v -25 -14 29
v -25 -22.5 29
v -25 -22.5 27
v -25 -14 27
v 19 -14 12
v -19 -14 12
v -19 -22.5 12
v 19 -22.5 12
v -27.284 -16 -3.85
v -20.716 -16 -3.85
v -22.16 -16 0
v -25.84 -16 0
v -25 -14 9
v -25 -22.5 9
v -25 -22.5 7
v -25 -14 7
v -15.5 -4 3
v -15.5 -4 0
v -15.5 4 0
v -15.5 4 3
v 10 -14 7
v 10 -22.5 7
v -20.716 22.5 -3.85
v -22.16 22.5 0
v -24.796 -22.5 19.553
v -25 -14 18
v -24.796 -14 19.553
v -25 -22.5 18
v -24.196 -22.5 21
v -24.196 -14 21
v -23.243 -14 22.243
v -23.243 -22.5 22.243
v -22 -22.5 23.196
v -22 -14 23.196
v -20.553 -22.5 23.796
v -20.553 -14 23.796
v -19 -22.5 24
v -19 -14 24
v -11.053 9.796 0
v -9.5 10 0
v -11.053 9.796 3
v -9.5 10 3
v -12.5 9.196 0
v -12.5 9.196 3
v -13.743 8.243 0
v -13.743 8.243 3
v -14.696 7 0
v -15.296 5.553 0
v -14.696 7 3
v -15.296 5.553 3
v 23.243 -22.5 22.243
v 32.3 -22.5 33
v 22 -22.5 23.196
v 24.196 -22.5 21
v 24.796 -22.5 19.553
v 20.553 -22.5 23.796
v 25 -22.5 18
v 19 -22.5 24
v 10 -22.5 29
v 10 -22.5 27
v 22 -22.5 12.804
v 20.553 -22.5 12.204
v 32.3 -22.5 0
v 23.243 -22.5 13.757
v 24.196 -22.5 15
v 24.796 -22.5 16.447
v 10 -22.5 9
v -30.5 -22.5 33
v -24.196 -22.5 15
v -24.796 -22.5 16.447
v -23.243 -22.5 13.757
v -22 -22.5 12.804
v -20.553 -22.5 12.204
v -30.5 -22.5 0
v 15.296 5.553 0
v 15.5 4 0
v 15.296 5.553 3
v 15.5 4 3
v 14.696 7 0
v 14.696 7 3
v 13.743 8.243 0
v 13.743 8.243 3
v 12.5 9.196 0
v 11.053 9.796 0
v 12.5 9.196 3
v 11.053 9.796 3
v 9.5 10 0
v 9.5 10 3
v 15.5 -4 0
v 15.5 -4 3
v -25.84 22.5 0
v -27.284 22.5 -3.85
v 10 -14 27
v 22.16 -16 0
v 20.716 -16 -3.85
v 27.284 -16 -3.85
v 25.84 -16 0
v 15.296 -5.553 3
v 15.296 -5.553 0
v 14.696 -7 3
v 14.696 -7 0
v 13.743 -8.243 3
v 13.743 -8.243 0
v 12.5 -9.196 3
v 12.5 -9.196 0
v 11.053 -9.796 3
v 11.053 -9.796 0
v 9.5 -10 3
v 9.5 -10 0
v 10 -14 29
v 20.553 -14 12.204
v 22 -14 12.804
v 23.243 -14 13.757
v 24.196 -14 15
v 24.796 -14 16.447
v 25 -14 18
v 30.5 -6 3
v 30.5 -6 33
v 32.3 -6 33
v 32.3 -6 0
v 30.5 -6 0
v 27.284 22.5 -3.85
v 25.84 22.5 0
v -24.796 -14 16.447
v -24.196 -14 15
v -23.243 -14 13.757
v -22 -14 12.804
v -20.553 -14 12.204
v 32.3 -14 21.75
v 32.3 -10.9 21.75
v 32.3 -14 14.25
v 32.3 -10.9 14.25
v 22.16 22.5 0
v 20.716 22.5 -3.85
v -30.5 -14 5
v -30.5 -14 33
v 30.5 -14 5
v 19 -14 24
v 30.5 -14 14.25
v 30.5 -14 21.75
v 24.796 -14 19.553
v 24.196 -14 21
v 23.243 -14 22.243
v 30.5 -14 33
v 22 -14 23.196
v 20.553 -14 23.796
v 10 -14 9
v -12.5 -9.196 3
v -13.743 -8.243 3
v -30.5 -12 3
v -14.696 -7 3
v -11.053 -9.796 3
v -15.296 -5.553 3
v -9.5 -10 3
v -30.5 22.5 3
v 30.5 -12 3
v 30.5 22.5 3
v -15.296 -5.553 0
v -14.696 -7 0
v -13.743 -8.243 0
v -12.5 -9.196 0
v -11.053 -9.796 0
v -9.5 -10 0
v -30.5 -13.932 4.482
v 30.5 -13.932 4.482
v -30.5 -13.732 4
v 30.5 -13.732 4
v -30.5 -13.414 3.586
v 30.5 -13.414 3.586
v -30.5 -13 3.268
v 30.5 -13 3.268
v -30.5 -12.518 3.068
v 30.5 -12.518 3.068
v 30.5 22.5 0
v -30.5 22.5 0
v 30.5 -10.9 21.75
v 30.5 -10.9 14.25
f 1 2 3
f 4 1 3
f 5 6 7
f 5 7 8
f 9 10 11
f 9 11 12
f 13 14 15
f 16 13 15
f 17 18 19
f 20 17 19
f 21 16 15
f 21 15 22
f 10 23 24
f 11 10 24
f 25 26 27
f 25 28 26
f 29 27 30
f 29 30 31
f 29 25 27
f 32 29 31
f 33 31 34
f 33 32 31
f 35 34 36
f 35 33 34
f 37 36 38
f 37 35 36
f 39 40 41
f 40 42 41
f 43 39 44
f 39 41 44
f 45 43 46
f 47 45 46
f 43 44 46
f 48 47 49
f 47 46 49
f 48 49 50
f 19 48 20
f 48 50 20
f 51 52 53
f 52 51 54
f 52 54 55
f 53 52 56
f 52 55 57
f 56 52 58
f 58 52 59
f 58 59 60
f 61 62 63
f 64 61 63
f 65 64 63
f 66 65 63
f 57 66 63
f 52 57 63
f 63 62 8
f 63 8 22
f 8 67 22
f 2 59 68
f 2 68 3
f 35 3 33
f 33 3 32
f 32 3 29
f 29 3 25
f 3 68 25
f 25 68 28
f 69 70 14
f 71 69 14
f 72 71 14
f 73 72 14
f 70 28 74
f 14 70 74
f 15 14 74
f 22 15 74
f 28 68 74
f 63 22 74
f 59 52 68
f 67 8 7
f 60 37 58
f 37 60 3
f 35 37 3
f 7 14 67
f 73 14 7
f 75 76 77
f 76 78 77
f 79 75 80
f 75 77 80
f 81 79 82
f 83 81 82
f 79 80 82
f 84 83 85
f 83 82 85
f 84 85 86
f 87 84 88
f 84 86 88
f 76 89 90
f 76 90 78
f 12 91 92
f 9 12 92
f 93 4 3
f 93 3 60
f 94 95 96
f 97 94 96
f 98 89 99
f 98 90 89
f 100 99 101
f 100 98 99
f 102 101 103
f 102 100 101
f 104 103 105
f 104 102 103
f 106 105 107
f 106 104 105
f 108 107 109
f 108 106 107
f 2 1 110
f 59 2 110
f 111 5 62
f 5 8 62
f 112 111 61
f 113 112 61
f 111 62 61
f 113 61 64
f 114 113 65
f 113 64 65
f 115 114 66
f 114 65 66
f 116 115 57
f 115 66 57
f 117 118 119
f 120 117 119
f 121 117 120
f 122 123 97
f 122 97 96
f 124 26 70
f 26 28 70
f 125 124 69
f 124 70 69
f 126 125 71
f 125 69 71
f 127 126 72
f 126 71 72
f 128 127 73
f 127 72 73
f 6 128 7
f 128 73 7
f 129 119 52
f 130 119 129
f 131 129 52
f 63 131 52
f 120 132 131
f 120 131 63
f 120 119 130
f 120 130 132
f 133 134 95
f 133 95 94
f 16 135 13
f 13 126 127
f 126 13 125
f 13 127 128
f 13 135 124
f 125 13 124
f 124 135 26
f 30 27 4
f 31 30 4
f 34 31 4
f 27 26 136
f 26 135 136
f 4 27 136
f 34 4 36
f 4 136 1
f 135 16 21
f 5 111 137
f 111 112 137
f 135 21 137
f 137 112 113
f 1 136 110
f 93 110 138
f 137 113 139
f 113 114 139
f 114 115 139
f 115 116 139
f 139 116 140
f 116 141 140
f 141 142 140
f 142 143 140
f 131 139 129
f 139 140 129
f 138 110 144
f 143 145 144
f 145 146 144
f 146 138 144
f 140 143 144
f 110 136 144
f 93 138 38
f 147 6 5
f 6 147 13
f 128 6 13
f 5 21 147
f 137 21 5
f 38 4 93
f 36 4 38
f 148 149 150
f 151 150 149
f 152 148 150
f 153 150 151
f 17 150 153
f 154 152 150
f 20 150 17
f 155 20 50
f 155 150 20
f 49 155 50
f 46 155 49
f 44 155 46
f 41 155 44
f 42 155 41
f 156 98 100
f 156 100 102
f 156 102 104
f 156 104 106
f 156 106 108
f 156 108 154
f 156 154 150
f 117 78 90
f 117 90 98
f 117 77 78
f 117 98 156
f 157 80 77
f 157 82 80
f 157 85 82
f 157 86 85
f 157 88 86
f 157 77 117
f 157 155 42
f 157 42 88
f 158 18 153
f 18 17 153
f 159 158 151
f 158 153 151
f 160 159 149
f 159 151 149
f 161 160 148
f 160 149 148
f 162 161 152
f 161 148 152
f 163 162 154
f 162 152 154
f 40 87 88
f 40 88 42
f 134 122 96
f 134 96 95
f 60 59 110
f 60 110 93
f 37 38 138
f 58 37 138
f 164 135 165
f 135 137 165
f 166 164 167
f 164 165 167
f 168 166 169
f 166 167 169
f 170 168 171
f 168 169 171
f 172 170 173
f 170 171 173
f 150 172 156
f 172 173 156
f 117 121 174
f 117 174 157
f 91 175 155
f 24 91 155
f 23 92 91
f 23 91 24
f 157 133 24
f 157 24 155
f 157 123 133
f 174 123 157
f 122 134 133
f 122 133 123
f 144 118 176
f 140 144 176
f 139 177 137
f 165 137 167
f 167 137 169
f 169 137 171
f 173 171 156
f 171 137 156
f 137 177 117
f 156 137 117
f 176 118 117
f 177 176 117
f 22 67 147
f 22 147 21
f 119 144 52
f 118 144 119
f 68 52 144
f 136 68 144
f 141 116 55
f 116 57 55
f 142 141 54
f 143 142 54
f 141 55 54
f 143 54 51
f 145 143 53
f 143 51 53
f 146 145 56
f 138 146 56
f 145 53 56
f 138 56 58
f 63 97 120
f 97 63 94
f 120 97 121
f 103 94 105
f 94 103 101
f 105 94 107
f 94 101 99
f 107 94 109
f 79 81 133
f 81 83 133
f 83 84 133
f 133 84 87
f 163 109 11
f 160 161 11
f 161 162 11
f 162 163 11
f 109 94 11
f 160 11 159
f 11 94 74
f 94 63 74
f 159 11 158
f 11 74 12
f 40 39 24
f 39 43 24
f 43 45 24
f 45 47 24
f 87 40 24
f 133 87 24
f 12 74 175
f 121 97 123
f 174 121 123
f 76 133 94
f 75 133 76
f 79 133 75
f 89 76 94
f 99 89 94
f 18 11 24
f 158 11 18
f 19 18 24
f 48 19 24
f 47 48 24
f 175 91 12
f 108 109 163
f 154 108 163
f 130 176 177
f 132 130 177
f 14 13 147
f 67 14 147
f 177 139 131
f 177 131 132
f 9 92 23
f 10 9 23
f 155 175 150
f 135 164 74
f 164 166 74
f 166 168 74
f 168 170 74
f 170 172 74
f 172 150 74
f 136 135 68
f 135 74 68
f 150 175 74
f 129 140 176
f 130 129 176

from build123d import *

# Parameters (mm, degrees)
SKETCH1_W           = 61
SKETCH1_H           = 45
BOSS_EXTRUDE1_DEPTH = 3
BOSS_EXTRUDE2_DEPTH = 38.5
SKETCH3_W           = 61
SKETCH3_H           = 30
BOSS_EXTRUDE3_DEPTH = 8.5
SKETCH4_W           = 35
SKETCH4_H           = 2
CUT_EXTRUDE1_DEPTH  = 8.5
SKETCH5_W           = 33
SKETCH5_H           = 16.5
SKETCH5_W_2         = 7.5
SKETCH5_H_2         = 3.1
BOSS_EXTRUDE4_DEPTH = 1.8
CUT_EXTRUDE2_REACH  = 60.86
SKETCH6_W           = 50
SKETCH6_H           = 12
CUT_EXTRUDE3_REACH  = 53.367
SKETCH7_W           = 31
SKETCH7_H           = 20
FILLET1_R           = 6
FILLET2_R           = 2


with BuildPart() as part:
    # Sketch1 → Boss-Extrude1 (new body)
    with BuildSketch(Plane.XY):
        Rectangle(SKETCH1_W, SKETCH1_H)
    extrude(amount=BOSS_EXTRUDE1_DEPTH)

    # Sketch2 → Boss-Extrude2 (add)
    with BuildSketch(Plane(origin=(0, 22.5, 0), x_dir=(1, 0, 0), z_dir=(0, 1, 0))):
        Polygon((-25.83979993, 0), (-27.28354993, 3.85), (-20.71645007, 3.85), (-22.16020007, 0), align=None)
        Polygon((20.71645007, 3.85), (22.16020007, 0), (25.83979993, 0), (27.28354993, 3.85), align=None)
    extrude(amount=-BOSS_EXTRUDE2_DEPTH)

    # Sketch3 → Boss-Extrude3 (add)
    with BuildSketch(Plane.XZ.offset(22.5)):
        with Locations((0, 18)):
            Rectangle(SKETCH3_W, SKETCH3_H)
    extrude(amount=-BOSS_EXTRUDE3_DEPTH)

    # Sketch4 → Cut-Extrude1 (cut)
    with BuildSketch(Plane(origin=(0, -14, 0), x_dir=(1, 0, 0), z_dir=(0, 1, 0))):
        with Locations((-7.5, -8)):
            Rectangle(SKETCH4_W, SKETCH4_H)
        with Locations((-7.5, -28)):
            Rectangle(SKETCH4_W, SKETCH4_H)
    extrude(amount=-CUT_EXTRUDE1_DEPTH, mode=Mode.SUBTRACT)

    # Sketch5 → Boss-Extrude4 (add)
    with BuildSketch(Plane(origin=(30.5, 0, 0), x_dir=(0, 0, -1), z_dir=(1, 0, 0))):
        with Locations((-16.5, -14.25)):
            Rectangle(SKETCH5_W, SKETCH5_H)
        with Locations((-18, -12.45)):
            Rectangle(SKETCH5_W_2, SKETCH5_H_2, mode=Mode.SUBTRACT)
    extrude(amount=BOSS_EXTRUDE4_DEPTH)

    # Sketch6 → Cut-Extrude2 (cut, up to next)
    with BuildSketch(Plane(origin=(0, -14, 0), x_dir=(1, 0, 0), z_dir=(0, 1, 0)), mode=Mode.PRIVATE) as cut_extrude2_sk1:
        with Locations((0, -18)):
            Rectangle(SKETCH6_W, SKETCH6_H)
    cut_extrude2_tool1 = extrude(cut_extrude2_sk1.sketch, amount=-CUT_EXTRUDE2_REACH, mode=Mode.PRIVATE) & part.part
    add(cut_extrude2_tool1.solids().sort_by_distance((0, -14, 18))[0], mode=Mode.SUBTRACT)

    # Sketch7 → Cut-Extrude3 (cut, up to next)
    with BuildSketch(Plane(origin=(0, 0, 0), x_dir=(-1, 0, 0), z_dir=(0, 0, -1)), mode=Mode.PRIVATE) as cut_extrude3_sk1:
        Rectangle(SKETCH7_W, SKETCH7_H)
    cut_extrude3_tool1 = extrude(cut_extrude3_sk1.sketch, amount=-CUT_EXTRUDE3_REACH, mode=Mode.PRIVATE) & part.part
    add(cut_extrude3_tool1.solids().sort_by_distance((0, 0, 0))[0], mode=Mode.SUBTRACT)

    # Fillet1
    fillet1_edges = [part.edges().sort_by_distance(p)[0] for p in [
        (-25, -18.25, 24),
        (-25, -18.25, 12),
        (25, -18.25, 24),
        (25, -18.25, 12),
        (-15.5, -10, 1.5),
        (-15.5, 10, 1.5),
        (15.5, 10, 1.5),
        (15.5, -10, 1.5),
    ]]
    fillet(fillet1_edges, radius=FILLET1_R - 0.0001)  # a hair under: the kernel refuses the full size

    # Fillet2
    fillet2_edges = [part.edges().sort_by_distance(p)[0] for p in [
        (0, -14, 3),
    ]]
    fillet(fillet2_edges, radius=FILLET2_R)


solid = part.part
